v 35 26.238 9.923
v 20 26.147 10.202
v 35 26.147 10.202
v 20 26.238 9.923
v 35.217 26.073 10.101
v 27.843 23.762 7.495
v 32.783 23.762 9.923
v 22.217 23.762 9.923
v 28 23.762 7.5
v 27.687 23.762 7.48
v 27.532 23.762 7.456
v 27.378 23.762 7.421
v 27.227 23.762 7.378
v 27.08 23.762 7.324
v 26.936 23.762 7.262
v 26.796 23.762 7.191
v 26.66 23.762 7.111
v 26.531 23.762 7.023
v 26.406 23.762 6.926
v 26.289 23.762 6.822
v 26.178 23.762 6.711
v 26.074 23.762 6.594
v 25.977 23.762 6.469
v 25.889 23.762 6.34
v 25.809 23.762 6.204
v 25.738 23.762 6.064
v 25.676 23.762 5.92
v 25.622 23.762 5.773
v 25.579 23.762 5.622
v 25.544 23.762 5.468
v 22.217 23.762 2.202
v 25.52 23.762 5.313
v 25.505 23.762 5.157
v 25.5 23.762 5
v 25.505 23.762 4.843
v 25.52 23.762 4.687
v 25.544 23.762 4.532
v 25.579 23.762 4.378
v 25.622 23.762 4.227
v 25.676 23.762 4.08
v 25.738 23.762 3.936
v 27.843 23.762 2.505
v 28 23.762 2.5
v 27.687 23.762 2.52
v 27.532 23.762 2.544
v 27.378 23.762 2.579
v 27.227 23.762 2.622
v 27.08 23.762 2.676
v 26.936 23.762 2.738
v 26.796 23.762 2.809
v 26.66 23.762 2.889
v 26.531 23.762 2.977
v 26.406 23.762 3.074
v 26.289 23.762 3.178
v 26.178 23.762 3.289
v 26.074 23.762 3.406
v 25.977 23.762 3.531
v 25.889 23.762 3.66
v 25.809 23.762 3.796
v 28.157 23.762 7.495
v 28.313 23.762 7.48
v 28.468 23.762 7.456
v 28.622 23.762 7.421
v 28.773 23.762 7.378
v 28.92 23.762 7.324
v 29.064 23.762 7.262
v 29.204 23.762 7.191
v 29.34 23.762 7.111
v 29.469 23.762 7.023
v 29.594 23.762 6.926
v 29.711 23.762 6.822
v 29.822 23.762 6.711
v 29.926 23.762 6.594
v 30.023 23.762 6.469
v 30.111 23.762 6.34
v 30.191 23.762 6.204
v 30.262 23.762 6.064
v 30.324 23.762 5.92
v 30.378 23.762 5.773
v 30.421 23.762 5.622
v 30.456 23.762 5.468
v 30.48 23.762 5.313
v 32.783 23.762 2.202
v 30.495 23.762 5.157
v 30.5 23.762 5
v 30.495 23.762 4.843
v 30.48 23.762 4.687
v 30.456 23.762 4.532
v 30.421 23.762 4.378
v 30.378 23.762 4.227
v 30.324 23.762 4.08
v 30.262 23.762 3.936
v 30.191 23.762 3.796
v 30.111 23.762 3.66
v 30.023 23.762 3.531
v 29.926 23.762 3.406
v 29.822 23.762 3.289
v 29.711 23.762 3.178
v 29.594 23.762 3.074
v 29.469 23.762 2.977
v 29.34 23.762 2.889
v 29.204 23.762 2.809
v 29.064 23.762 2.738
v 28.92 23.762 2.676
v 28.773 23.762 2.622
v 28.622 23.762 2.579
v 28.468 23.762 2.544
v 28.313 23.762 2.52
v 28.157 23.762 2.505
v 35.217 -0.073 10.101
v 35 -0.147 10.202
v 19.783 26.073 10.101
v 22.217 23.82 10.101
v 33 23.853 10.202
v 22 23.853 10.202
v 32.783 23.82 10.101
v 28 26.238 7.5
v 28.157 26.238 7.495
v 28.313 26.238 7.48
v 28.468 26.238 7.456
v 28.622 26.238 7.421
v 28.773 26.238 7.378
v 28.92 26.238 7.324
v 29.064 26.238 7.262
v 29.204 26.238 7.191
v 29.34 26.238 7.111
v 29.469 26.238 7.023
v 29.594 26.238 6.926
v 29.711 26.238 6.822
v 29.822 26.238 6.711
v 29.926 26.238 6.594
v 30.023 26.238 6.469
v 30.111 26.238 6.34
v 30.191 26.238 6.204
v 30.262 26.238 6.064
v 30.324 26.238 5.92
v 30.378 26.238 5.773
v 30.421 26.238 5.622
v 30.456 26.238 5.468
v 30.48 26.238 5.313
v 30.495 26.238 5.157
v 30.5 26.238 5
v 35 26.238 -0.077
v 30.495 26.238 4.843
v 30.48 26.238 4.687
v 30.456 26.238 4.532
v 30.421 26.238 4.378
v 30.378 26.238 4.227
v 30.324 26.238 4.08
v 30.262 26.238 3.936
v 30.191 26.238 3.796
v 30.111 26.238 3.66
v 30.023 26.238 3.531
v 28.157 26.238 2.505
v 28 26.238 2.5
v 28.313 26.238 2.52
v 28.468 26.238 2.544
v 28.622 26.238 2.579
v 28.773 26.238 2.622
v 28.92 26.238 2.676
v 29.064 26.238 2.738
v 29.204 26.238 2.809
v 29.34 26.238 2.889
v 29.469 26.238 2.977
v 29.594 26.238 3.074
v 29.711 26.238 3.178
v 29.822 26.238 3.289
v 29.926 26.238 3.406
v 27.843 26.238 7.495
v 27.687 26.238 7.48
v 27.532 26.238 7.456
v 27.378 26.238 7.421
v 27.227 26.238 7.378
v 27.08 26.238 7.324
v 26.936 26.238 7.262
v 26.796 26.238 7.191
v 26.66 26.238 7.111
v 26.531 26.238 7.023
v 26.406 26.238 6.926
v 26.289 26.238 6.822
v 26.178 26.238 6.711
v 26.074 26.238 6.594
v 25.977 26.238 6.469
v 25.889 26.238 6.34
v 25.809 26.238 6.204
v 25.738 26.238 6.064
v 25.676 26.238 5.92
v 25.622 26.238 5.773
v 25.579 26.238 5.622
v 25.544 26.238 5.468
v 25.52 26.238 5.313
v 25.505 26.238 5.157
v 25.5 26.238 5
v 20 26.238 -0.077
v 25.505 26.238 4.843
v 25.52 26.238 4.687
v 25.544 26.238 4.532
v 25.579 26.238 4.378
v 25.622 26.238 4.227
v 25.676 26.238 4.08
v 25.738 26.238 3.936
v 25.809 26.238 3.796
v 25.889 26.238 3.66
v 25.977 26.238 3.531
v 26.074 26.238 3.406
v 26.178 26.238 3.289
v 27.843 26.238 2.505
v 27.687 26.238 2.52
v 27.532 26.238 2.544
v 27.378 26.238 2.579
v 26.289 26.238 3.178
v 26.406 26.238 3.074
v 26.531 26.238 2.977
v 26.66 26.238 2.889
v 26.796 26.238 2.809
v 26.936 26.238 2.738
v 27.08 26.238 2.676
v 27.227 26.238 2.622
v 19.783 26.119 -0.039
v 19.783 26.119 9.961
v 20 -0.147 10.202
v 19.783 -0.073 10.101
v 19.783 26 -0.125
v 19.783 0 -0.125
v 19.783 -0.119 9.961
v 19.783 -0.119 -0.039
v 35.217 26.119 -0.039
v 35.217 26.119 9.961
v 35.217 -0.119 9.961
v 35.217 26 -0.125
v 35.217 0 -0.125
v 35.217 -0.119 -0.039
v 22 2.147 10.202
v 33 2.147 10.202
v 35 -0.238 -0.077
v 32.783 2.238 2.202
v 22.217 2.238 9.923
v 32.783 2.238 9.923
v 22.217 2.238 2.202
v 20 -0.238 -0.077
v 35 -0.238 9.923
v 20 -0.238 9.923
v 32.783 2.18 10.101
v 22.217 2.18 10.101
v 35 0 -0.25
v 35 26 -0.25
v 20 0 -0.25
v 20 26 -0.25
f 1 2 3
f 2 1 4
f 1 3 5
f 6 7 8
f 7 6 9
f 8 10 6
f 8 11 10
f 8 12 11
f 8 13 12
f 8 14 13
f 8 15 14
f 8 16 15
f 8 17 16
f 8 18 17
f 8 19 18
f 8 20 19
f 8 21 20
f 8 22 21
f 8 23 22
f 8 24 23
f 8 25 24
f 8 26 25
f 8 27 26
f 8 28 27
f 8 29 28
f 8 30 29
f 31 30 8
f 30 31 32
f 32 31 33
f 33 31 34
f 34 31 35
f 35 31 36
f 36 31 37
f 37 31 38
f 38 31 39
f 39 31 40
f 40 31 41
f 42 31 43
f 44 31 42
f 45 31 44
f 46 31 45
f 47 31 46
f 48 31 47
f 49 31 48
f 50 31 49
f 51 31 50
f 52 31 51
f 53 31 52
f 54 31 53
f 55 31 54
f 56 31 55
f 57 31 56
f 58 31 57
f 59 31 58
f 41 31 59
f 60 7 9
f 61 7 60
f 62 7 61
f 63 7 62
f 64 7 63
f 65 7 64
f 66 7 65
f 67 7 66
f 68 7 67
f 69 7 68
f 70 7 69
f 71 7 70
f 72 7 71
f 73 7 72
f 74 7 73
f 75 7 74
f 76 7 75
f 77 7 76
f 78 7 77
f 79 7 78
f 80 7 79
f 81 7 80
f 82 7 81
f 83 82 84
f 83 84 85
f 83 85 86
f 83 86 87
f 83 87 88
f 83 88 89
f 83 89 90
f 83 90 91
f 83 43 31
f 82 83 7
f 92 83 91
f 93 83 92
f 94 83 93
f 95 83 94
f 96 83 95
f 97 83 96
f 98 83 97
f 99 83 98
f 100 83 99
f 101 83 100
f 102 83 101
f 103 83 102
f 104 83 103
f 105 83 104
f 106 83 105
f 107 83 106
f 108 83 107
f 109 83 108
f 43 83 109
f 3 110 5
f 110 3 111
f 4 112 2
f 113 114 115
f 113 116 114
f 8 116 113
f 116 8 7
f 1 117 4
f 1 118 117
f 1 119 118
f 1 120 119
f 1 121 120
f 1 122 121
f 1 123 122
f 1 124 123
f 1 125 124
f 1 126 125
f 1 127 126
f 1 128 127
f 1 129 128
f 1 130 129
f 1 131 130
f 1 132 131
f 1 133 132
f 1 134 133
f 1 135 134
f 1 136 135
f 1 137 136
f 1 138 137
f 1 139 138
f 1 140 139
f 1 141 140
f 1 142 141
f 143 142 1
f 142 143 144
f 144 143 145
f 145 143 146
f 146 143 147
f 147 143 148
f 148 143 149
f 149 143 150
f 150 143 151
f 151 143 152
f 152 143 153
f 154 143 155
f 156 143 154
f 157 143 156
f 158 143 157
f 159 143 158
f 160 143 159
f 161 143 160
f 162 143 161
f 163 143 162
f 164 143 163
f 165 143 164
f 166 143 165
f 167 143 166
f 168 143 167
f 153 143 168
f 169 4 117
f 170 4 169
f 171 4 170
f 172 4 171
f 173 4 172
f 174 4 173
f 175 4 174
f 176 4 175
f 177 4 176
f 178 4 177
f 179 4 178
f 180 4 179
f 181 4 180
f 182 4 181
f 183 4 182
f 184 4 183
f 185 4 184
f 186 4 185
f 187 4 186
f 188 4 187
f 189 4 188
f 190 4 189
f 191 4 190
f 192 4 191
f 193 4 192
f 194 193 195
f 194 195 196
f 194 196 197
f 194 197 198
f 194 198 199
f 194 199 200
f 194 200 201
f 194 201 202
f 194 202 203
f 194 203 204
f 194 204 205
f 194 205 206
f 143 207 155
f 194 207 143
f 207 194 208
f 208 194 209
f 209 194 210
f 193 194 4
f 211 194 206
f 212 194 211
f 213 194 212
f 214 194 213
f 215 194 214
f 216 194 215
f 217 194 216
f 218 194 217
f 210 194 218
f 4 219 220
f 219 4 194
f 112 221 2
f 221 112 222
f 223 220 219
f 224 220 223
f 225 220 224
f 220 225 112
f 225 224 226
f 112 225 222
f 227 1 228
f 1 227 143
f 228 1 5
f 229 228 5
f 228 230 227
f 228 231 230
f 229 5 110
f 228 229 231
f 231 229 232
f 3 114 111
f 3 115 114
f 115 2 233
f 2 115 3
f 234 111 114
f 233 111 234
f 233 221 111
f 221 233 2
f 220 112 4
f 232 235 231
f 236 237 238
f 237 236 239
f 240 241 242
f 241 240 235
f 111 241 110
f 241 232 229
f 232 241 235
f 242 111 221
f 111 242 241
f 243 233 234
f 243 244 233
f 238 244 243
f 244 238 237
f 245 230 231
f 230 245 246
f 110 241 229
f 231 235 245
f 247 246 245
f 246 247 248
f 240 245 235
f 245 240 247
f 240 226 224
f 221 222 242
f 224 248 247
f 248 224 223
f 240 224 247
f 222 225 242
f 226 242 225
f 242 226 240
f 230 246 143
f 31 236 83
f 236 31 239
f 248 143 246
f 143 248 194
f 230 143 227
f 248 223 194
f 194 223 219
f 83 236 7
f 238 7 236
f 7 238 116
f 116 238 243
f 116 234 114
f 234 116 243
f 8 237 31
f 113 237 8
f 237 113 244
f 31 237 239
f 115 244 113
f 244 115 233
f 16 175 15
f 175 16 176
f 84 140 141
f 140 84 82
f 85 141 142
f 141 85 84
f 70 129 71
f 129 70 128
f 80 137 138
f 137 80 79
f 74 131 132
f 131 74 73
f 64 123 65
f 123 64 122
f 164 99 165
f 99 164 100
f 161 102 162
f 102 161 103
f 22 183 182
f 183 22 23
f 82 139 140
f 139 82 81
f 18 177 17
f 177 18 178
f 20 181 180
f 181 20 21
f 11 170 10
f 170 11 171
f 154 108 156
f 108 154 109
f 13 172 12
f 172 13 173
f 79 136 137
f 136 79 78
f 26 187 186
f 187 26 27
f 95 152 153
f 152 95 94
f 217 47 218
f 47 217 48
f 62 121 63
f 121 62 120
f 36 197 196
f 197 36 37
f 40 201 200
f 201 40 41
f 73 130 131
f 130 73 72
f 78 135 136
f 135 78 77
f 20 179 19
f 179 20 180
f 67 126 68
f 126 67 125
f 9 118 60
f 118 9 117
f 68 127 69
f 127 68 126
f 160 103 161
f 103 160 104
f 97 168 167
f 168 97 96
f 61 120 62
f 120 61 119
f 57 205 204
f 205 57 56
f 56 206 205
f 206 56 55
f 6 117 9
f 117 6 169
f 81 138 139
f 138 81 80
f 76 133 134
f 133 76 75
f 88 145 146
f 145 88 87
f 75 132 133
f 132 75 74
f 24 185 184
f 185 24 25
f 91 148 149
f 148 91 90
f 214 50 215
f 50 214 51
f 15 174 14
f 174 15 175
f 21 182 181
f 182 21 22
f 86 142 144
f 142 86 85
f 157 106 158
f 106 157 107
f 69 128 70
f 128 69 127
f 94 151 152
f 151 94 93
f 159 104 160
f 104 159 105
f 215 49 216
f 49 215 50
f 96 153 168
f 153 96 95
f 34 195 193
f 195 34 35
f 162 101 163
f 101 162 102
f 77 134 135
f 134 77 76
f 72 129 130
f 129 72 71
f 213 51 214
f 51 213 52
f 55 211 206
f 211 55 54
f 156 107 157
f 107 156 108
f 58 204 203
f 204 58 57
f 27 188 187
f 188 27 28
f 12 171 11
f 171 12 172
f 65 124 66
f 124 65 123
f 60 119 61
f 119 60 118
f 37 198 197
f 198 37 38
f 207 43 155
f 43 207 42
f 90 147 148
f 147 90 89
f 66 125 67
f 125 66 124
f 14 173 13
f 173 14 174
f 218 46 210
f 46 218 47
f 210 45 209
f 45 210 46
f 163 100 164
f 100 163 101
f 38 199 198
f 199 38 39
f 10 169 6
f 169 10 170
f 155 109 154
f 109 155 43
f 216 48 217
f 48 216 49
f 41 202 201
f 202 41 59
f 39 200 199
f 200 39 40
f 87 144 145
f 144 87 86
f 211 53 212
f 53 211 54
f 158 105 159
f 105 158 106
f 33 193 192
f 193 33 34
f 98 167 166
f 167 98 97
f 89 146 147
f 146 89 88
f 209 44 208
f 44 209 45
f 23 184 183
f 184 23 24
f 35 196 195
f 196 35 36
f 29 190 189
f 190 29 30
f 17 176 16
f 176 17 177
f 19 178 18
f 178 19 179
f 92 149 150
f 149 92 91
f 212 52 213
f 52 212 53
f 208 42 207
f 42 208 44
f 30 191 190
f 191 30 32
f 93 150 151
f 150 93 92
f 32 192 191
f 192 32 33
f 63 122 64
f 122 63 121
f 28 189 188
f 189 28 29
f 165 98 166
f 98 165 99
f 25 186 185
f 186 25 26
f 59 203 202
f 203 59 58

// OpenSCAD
inside_x=11;
inside_y=22;
inside_z=6;
borders_z=5;
borders_width=2;
//deck
box_x=inside_x+borders_width*2;
box_y=inside_y+borders_width*2;
deck_z=2;
//only for box
hole_radius=2.5;
hole_z=5;
box_z=inside_z+borders_width+deck_z;
//displayhole
disp_x=30;
disp_y=20;
movedisp_x=1;
movedisp_y=25;

module deck1() {
difference(){
cube([box_x,box_y,deck_z]);
translate([movedisp_x,movedisp_y,0]) cube([disp_x,disp_y,deck_z]); //displayhole
}}


module squareBorders(x_length,y_length,z_length,width){
difference(){
    //outer
cube([x_length,y_length,z_length]);
    //inside cutter
translate([width,width,-1]) cube([x_length-2*width,y_length-2*width,z_length+3]);
}
}

//deck
/*
deck1();
    
translate([borders_width,borders_width,0]) squareBorders(box_x-2*borders_width,box_y-2*borders_width,borders_z,borders_width);
*/

//box


module box1() {
    difference(){
    cube([box_x,box_y,box_z]);
    translate([borders_width,borders_width,borders_width]) cube([box_x-borders_width*2,box_y-borders_width*2,box_z+9]);}
}

module cylinderCut(){
    rotate([90,0,0]) cylinder(h=5,r=hole_radius, $fn=100); //cylinder for cutting holes for wires
}

module minkowskiCylinder(){
rotate([90,90,90])   sphere(d=0.5);//cylinder(d=0.5,h=0.5,$fn=100);
}

translate([box_x+5,0,0]){    
difference(){
minkowski() { box1();
minkowskiCylinder();
}
//translate([18,3,hole_z]) cylinderCut();
//translate([28,3,hole_z]) cylinderCut();
//#translate([9,box_y+1,hole_z]) cylinderCut();
#translate([8,box_y+1,hole_z]) cylinderCut();
}}
